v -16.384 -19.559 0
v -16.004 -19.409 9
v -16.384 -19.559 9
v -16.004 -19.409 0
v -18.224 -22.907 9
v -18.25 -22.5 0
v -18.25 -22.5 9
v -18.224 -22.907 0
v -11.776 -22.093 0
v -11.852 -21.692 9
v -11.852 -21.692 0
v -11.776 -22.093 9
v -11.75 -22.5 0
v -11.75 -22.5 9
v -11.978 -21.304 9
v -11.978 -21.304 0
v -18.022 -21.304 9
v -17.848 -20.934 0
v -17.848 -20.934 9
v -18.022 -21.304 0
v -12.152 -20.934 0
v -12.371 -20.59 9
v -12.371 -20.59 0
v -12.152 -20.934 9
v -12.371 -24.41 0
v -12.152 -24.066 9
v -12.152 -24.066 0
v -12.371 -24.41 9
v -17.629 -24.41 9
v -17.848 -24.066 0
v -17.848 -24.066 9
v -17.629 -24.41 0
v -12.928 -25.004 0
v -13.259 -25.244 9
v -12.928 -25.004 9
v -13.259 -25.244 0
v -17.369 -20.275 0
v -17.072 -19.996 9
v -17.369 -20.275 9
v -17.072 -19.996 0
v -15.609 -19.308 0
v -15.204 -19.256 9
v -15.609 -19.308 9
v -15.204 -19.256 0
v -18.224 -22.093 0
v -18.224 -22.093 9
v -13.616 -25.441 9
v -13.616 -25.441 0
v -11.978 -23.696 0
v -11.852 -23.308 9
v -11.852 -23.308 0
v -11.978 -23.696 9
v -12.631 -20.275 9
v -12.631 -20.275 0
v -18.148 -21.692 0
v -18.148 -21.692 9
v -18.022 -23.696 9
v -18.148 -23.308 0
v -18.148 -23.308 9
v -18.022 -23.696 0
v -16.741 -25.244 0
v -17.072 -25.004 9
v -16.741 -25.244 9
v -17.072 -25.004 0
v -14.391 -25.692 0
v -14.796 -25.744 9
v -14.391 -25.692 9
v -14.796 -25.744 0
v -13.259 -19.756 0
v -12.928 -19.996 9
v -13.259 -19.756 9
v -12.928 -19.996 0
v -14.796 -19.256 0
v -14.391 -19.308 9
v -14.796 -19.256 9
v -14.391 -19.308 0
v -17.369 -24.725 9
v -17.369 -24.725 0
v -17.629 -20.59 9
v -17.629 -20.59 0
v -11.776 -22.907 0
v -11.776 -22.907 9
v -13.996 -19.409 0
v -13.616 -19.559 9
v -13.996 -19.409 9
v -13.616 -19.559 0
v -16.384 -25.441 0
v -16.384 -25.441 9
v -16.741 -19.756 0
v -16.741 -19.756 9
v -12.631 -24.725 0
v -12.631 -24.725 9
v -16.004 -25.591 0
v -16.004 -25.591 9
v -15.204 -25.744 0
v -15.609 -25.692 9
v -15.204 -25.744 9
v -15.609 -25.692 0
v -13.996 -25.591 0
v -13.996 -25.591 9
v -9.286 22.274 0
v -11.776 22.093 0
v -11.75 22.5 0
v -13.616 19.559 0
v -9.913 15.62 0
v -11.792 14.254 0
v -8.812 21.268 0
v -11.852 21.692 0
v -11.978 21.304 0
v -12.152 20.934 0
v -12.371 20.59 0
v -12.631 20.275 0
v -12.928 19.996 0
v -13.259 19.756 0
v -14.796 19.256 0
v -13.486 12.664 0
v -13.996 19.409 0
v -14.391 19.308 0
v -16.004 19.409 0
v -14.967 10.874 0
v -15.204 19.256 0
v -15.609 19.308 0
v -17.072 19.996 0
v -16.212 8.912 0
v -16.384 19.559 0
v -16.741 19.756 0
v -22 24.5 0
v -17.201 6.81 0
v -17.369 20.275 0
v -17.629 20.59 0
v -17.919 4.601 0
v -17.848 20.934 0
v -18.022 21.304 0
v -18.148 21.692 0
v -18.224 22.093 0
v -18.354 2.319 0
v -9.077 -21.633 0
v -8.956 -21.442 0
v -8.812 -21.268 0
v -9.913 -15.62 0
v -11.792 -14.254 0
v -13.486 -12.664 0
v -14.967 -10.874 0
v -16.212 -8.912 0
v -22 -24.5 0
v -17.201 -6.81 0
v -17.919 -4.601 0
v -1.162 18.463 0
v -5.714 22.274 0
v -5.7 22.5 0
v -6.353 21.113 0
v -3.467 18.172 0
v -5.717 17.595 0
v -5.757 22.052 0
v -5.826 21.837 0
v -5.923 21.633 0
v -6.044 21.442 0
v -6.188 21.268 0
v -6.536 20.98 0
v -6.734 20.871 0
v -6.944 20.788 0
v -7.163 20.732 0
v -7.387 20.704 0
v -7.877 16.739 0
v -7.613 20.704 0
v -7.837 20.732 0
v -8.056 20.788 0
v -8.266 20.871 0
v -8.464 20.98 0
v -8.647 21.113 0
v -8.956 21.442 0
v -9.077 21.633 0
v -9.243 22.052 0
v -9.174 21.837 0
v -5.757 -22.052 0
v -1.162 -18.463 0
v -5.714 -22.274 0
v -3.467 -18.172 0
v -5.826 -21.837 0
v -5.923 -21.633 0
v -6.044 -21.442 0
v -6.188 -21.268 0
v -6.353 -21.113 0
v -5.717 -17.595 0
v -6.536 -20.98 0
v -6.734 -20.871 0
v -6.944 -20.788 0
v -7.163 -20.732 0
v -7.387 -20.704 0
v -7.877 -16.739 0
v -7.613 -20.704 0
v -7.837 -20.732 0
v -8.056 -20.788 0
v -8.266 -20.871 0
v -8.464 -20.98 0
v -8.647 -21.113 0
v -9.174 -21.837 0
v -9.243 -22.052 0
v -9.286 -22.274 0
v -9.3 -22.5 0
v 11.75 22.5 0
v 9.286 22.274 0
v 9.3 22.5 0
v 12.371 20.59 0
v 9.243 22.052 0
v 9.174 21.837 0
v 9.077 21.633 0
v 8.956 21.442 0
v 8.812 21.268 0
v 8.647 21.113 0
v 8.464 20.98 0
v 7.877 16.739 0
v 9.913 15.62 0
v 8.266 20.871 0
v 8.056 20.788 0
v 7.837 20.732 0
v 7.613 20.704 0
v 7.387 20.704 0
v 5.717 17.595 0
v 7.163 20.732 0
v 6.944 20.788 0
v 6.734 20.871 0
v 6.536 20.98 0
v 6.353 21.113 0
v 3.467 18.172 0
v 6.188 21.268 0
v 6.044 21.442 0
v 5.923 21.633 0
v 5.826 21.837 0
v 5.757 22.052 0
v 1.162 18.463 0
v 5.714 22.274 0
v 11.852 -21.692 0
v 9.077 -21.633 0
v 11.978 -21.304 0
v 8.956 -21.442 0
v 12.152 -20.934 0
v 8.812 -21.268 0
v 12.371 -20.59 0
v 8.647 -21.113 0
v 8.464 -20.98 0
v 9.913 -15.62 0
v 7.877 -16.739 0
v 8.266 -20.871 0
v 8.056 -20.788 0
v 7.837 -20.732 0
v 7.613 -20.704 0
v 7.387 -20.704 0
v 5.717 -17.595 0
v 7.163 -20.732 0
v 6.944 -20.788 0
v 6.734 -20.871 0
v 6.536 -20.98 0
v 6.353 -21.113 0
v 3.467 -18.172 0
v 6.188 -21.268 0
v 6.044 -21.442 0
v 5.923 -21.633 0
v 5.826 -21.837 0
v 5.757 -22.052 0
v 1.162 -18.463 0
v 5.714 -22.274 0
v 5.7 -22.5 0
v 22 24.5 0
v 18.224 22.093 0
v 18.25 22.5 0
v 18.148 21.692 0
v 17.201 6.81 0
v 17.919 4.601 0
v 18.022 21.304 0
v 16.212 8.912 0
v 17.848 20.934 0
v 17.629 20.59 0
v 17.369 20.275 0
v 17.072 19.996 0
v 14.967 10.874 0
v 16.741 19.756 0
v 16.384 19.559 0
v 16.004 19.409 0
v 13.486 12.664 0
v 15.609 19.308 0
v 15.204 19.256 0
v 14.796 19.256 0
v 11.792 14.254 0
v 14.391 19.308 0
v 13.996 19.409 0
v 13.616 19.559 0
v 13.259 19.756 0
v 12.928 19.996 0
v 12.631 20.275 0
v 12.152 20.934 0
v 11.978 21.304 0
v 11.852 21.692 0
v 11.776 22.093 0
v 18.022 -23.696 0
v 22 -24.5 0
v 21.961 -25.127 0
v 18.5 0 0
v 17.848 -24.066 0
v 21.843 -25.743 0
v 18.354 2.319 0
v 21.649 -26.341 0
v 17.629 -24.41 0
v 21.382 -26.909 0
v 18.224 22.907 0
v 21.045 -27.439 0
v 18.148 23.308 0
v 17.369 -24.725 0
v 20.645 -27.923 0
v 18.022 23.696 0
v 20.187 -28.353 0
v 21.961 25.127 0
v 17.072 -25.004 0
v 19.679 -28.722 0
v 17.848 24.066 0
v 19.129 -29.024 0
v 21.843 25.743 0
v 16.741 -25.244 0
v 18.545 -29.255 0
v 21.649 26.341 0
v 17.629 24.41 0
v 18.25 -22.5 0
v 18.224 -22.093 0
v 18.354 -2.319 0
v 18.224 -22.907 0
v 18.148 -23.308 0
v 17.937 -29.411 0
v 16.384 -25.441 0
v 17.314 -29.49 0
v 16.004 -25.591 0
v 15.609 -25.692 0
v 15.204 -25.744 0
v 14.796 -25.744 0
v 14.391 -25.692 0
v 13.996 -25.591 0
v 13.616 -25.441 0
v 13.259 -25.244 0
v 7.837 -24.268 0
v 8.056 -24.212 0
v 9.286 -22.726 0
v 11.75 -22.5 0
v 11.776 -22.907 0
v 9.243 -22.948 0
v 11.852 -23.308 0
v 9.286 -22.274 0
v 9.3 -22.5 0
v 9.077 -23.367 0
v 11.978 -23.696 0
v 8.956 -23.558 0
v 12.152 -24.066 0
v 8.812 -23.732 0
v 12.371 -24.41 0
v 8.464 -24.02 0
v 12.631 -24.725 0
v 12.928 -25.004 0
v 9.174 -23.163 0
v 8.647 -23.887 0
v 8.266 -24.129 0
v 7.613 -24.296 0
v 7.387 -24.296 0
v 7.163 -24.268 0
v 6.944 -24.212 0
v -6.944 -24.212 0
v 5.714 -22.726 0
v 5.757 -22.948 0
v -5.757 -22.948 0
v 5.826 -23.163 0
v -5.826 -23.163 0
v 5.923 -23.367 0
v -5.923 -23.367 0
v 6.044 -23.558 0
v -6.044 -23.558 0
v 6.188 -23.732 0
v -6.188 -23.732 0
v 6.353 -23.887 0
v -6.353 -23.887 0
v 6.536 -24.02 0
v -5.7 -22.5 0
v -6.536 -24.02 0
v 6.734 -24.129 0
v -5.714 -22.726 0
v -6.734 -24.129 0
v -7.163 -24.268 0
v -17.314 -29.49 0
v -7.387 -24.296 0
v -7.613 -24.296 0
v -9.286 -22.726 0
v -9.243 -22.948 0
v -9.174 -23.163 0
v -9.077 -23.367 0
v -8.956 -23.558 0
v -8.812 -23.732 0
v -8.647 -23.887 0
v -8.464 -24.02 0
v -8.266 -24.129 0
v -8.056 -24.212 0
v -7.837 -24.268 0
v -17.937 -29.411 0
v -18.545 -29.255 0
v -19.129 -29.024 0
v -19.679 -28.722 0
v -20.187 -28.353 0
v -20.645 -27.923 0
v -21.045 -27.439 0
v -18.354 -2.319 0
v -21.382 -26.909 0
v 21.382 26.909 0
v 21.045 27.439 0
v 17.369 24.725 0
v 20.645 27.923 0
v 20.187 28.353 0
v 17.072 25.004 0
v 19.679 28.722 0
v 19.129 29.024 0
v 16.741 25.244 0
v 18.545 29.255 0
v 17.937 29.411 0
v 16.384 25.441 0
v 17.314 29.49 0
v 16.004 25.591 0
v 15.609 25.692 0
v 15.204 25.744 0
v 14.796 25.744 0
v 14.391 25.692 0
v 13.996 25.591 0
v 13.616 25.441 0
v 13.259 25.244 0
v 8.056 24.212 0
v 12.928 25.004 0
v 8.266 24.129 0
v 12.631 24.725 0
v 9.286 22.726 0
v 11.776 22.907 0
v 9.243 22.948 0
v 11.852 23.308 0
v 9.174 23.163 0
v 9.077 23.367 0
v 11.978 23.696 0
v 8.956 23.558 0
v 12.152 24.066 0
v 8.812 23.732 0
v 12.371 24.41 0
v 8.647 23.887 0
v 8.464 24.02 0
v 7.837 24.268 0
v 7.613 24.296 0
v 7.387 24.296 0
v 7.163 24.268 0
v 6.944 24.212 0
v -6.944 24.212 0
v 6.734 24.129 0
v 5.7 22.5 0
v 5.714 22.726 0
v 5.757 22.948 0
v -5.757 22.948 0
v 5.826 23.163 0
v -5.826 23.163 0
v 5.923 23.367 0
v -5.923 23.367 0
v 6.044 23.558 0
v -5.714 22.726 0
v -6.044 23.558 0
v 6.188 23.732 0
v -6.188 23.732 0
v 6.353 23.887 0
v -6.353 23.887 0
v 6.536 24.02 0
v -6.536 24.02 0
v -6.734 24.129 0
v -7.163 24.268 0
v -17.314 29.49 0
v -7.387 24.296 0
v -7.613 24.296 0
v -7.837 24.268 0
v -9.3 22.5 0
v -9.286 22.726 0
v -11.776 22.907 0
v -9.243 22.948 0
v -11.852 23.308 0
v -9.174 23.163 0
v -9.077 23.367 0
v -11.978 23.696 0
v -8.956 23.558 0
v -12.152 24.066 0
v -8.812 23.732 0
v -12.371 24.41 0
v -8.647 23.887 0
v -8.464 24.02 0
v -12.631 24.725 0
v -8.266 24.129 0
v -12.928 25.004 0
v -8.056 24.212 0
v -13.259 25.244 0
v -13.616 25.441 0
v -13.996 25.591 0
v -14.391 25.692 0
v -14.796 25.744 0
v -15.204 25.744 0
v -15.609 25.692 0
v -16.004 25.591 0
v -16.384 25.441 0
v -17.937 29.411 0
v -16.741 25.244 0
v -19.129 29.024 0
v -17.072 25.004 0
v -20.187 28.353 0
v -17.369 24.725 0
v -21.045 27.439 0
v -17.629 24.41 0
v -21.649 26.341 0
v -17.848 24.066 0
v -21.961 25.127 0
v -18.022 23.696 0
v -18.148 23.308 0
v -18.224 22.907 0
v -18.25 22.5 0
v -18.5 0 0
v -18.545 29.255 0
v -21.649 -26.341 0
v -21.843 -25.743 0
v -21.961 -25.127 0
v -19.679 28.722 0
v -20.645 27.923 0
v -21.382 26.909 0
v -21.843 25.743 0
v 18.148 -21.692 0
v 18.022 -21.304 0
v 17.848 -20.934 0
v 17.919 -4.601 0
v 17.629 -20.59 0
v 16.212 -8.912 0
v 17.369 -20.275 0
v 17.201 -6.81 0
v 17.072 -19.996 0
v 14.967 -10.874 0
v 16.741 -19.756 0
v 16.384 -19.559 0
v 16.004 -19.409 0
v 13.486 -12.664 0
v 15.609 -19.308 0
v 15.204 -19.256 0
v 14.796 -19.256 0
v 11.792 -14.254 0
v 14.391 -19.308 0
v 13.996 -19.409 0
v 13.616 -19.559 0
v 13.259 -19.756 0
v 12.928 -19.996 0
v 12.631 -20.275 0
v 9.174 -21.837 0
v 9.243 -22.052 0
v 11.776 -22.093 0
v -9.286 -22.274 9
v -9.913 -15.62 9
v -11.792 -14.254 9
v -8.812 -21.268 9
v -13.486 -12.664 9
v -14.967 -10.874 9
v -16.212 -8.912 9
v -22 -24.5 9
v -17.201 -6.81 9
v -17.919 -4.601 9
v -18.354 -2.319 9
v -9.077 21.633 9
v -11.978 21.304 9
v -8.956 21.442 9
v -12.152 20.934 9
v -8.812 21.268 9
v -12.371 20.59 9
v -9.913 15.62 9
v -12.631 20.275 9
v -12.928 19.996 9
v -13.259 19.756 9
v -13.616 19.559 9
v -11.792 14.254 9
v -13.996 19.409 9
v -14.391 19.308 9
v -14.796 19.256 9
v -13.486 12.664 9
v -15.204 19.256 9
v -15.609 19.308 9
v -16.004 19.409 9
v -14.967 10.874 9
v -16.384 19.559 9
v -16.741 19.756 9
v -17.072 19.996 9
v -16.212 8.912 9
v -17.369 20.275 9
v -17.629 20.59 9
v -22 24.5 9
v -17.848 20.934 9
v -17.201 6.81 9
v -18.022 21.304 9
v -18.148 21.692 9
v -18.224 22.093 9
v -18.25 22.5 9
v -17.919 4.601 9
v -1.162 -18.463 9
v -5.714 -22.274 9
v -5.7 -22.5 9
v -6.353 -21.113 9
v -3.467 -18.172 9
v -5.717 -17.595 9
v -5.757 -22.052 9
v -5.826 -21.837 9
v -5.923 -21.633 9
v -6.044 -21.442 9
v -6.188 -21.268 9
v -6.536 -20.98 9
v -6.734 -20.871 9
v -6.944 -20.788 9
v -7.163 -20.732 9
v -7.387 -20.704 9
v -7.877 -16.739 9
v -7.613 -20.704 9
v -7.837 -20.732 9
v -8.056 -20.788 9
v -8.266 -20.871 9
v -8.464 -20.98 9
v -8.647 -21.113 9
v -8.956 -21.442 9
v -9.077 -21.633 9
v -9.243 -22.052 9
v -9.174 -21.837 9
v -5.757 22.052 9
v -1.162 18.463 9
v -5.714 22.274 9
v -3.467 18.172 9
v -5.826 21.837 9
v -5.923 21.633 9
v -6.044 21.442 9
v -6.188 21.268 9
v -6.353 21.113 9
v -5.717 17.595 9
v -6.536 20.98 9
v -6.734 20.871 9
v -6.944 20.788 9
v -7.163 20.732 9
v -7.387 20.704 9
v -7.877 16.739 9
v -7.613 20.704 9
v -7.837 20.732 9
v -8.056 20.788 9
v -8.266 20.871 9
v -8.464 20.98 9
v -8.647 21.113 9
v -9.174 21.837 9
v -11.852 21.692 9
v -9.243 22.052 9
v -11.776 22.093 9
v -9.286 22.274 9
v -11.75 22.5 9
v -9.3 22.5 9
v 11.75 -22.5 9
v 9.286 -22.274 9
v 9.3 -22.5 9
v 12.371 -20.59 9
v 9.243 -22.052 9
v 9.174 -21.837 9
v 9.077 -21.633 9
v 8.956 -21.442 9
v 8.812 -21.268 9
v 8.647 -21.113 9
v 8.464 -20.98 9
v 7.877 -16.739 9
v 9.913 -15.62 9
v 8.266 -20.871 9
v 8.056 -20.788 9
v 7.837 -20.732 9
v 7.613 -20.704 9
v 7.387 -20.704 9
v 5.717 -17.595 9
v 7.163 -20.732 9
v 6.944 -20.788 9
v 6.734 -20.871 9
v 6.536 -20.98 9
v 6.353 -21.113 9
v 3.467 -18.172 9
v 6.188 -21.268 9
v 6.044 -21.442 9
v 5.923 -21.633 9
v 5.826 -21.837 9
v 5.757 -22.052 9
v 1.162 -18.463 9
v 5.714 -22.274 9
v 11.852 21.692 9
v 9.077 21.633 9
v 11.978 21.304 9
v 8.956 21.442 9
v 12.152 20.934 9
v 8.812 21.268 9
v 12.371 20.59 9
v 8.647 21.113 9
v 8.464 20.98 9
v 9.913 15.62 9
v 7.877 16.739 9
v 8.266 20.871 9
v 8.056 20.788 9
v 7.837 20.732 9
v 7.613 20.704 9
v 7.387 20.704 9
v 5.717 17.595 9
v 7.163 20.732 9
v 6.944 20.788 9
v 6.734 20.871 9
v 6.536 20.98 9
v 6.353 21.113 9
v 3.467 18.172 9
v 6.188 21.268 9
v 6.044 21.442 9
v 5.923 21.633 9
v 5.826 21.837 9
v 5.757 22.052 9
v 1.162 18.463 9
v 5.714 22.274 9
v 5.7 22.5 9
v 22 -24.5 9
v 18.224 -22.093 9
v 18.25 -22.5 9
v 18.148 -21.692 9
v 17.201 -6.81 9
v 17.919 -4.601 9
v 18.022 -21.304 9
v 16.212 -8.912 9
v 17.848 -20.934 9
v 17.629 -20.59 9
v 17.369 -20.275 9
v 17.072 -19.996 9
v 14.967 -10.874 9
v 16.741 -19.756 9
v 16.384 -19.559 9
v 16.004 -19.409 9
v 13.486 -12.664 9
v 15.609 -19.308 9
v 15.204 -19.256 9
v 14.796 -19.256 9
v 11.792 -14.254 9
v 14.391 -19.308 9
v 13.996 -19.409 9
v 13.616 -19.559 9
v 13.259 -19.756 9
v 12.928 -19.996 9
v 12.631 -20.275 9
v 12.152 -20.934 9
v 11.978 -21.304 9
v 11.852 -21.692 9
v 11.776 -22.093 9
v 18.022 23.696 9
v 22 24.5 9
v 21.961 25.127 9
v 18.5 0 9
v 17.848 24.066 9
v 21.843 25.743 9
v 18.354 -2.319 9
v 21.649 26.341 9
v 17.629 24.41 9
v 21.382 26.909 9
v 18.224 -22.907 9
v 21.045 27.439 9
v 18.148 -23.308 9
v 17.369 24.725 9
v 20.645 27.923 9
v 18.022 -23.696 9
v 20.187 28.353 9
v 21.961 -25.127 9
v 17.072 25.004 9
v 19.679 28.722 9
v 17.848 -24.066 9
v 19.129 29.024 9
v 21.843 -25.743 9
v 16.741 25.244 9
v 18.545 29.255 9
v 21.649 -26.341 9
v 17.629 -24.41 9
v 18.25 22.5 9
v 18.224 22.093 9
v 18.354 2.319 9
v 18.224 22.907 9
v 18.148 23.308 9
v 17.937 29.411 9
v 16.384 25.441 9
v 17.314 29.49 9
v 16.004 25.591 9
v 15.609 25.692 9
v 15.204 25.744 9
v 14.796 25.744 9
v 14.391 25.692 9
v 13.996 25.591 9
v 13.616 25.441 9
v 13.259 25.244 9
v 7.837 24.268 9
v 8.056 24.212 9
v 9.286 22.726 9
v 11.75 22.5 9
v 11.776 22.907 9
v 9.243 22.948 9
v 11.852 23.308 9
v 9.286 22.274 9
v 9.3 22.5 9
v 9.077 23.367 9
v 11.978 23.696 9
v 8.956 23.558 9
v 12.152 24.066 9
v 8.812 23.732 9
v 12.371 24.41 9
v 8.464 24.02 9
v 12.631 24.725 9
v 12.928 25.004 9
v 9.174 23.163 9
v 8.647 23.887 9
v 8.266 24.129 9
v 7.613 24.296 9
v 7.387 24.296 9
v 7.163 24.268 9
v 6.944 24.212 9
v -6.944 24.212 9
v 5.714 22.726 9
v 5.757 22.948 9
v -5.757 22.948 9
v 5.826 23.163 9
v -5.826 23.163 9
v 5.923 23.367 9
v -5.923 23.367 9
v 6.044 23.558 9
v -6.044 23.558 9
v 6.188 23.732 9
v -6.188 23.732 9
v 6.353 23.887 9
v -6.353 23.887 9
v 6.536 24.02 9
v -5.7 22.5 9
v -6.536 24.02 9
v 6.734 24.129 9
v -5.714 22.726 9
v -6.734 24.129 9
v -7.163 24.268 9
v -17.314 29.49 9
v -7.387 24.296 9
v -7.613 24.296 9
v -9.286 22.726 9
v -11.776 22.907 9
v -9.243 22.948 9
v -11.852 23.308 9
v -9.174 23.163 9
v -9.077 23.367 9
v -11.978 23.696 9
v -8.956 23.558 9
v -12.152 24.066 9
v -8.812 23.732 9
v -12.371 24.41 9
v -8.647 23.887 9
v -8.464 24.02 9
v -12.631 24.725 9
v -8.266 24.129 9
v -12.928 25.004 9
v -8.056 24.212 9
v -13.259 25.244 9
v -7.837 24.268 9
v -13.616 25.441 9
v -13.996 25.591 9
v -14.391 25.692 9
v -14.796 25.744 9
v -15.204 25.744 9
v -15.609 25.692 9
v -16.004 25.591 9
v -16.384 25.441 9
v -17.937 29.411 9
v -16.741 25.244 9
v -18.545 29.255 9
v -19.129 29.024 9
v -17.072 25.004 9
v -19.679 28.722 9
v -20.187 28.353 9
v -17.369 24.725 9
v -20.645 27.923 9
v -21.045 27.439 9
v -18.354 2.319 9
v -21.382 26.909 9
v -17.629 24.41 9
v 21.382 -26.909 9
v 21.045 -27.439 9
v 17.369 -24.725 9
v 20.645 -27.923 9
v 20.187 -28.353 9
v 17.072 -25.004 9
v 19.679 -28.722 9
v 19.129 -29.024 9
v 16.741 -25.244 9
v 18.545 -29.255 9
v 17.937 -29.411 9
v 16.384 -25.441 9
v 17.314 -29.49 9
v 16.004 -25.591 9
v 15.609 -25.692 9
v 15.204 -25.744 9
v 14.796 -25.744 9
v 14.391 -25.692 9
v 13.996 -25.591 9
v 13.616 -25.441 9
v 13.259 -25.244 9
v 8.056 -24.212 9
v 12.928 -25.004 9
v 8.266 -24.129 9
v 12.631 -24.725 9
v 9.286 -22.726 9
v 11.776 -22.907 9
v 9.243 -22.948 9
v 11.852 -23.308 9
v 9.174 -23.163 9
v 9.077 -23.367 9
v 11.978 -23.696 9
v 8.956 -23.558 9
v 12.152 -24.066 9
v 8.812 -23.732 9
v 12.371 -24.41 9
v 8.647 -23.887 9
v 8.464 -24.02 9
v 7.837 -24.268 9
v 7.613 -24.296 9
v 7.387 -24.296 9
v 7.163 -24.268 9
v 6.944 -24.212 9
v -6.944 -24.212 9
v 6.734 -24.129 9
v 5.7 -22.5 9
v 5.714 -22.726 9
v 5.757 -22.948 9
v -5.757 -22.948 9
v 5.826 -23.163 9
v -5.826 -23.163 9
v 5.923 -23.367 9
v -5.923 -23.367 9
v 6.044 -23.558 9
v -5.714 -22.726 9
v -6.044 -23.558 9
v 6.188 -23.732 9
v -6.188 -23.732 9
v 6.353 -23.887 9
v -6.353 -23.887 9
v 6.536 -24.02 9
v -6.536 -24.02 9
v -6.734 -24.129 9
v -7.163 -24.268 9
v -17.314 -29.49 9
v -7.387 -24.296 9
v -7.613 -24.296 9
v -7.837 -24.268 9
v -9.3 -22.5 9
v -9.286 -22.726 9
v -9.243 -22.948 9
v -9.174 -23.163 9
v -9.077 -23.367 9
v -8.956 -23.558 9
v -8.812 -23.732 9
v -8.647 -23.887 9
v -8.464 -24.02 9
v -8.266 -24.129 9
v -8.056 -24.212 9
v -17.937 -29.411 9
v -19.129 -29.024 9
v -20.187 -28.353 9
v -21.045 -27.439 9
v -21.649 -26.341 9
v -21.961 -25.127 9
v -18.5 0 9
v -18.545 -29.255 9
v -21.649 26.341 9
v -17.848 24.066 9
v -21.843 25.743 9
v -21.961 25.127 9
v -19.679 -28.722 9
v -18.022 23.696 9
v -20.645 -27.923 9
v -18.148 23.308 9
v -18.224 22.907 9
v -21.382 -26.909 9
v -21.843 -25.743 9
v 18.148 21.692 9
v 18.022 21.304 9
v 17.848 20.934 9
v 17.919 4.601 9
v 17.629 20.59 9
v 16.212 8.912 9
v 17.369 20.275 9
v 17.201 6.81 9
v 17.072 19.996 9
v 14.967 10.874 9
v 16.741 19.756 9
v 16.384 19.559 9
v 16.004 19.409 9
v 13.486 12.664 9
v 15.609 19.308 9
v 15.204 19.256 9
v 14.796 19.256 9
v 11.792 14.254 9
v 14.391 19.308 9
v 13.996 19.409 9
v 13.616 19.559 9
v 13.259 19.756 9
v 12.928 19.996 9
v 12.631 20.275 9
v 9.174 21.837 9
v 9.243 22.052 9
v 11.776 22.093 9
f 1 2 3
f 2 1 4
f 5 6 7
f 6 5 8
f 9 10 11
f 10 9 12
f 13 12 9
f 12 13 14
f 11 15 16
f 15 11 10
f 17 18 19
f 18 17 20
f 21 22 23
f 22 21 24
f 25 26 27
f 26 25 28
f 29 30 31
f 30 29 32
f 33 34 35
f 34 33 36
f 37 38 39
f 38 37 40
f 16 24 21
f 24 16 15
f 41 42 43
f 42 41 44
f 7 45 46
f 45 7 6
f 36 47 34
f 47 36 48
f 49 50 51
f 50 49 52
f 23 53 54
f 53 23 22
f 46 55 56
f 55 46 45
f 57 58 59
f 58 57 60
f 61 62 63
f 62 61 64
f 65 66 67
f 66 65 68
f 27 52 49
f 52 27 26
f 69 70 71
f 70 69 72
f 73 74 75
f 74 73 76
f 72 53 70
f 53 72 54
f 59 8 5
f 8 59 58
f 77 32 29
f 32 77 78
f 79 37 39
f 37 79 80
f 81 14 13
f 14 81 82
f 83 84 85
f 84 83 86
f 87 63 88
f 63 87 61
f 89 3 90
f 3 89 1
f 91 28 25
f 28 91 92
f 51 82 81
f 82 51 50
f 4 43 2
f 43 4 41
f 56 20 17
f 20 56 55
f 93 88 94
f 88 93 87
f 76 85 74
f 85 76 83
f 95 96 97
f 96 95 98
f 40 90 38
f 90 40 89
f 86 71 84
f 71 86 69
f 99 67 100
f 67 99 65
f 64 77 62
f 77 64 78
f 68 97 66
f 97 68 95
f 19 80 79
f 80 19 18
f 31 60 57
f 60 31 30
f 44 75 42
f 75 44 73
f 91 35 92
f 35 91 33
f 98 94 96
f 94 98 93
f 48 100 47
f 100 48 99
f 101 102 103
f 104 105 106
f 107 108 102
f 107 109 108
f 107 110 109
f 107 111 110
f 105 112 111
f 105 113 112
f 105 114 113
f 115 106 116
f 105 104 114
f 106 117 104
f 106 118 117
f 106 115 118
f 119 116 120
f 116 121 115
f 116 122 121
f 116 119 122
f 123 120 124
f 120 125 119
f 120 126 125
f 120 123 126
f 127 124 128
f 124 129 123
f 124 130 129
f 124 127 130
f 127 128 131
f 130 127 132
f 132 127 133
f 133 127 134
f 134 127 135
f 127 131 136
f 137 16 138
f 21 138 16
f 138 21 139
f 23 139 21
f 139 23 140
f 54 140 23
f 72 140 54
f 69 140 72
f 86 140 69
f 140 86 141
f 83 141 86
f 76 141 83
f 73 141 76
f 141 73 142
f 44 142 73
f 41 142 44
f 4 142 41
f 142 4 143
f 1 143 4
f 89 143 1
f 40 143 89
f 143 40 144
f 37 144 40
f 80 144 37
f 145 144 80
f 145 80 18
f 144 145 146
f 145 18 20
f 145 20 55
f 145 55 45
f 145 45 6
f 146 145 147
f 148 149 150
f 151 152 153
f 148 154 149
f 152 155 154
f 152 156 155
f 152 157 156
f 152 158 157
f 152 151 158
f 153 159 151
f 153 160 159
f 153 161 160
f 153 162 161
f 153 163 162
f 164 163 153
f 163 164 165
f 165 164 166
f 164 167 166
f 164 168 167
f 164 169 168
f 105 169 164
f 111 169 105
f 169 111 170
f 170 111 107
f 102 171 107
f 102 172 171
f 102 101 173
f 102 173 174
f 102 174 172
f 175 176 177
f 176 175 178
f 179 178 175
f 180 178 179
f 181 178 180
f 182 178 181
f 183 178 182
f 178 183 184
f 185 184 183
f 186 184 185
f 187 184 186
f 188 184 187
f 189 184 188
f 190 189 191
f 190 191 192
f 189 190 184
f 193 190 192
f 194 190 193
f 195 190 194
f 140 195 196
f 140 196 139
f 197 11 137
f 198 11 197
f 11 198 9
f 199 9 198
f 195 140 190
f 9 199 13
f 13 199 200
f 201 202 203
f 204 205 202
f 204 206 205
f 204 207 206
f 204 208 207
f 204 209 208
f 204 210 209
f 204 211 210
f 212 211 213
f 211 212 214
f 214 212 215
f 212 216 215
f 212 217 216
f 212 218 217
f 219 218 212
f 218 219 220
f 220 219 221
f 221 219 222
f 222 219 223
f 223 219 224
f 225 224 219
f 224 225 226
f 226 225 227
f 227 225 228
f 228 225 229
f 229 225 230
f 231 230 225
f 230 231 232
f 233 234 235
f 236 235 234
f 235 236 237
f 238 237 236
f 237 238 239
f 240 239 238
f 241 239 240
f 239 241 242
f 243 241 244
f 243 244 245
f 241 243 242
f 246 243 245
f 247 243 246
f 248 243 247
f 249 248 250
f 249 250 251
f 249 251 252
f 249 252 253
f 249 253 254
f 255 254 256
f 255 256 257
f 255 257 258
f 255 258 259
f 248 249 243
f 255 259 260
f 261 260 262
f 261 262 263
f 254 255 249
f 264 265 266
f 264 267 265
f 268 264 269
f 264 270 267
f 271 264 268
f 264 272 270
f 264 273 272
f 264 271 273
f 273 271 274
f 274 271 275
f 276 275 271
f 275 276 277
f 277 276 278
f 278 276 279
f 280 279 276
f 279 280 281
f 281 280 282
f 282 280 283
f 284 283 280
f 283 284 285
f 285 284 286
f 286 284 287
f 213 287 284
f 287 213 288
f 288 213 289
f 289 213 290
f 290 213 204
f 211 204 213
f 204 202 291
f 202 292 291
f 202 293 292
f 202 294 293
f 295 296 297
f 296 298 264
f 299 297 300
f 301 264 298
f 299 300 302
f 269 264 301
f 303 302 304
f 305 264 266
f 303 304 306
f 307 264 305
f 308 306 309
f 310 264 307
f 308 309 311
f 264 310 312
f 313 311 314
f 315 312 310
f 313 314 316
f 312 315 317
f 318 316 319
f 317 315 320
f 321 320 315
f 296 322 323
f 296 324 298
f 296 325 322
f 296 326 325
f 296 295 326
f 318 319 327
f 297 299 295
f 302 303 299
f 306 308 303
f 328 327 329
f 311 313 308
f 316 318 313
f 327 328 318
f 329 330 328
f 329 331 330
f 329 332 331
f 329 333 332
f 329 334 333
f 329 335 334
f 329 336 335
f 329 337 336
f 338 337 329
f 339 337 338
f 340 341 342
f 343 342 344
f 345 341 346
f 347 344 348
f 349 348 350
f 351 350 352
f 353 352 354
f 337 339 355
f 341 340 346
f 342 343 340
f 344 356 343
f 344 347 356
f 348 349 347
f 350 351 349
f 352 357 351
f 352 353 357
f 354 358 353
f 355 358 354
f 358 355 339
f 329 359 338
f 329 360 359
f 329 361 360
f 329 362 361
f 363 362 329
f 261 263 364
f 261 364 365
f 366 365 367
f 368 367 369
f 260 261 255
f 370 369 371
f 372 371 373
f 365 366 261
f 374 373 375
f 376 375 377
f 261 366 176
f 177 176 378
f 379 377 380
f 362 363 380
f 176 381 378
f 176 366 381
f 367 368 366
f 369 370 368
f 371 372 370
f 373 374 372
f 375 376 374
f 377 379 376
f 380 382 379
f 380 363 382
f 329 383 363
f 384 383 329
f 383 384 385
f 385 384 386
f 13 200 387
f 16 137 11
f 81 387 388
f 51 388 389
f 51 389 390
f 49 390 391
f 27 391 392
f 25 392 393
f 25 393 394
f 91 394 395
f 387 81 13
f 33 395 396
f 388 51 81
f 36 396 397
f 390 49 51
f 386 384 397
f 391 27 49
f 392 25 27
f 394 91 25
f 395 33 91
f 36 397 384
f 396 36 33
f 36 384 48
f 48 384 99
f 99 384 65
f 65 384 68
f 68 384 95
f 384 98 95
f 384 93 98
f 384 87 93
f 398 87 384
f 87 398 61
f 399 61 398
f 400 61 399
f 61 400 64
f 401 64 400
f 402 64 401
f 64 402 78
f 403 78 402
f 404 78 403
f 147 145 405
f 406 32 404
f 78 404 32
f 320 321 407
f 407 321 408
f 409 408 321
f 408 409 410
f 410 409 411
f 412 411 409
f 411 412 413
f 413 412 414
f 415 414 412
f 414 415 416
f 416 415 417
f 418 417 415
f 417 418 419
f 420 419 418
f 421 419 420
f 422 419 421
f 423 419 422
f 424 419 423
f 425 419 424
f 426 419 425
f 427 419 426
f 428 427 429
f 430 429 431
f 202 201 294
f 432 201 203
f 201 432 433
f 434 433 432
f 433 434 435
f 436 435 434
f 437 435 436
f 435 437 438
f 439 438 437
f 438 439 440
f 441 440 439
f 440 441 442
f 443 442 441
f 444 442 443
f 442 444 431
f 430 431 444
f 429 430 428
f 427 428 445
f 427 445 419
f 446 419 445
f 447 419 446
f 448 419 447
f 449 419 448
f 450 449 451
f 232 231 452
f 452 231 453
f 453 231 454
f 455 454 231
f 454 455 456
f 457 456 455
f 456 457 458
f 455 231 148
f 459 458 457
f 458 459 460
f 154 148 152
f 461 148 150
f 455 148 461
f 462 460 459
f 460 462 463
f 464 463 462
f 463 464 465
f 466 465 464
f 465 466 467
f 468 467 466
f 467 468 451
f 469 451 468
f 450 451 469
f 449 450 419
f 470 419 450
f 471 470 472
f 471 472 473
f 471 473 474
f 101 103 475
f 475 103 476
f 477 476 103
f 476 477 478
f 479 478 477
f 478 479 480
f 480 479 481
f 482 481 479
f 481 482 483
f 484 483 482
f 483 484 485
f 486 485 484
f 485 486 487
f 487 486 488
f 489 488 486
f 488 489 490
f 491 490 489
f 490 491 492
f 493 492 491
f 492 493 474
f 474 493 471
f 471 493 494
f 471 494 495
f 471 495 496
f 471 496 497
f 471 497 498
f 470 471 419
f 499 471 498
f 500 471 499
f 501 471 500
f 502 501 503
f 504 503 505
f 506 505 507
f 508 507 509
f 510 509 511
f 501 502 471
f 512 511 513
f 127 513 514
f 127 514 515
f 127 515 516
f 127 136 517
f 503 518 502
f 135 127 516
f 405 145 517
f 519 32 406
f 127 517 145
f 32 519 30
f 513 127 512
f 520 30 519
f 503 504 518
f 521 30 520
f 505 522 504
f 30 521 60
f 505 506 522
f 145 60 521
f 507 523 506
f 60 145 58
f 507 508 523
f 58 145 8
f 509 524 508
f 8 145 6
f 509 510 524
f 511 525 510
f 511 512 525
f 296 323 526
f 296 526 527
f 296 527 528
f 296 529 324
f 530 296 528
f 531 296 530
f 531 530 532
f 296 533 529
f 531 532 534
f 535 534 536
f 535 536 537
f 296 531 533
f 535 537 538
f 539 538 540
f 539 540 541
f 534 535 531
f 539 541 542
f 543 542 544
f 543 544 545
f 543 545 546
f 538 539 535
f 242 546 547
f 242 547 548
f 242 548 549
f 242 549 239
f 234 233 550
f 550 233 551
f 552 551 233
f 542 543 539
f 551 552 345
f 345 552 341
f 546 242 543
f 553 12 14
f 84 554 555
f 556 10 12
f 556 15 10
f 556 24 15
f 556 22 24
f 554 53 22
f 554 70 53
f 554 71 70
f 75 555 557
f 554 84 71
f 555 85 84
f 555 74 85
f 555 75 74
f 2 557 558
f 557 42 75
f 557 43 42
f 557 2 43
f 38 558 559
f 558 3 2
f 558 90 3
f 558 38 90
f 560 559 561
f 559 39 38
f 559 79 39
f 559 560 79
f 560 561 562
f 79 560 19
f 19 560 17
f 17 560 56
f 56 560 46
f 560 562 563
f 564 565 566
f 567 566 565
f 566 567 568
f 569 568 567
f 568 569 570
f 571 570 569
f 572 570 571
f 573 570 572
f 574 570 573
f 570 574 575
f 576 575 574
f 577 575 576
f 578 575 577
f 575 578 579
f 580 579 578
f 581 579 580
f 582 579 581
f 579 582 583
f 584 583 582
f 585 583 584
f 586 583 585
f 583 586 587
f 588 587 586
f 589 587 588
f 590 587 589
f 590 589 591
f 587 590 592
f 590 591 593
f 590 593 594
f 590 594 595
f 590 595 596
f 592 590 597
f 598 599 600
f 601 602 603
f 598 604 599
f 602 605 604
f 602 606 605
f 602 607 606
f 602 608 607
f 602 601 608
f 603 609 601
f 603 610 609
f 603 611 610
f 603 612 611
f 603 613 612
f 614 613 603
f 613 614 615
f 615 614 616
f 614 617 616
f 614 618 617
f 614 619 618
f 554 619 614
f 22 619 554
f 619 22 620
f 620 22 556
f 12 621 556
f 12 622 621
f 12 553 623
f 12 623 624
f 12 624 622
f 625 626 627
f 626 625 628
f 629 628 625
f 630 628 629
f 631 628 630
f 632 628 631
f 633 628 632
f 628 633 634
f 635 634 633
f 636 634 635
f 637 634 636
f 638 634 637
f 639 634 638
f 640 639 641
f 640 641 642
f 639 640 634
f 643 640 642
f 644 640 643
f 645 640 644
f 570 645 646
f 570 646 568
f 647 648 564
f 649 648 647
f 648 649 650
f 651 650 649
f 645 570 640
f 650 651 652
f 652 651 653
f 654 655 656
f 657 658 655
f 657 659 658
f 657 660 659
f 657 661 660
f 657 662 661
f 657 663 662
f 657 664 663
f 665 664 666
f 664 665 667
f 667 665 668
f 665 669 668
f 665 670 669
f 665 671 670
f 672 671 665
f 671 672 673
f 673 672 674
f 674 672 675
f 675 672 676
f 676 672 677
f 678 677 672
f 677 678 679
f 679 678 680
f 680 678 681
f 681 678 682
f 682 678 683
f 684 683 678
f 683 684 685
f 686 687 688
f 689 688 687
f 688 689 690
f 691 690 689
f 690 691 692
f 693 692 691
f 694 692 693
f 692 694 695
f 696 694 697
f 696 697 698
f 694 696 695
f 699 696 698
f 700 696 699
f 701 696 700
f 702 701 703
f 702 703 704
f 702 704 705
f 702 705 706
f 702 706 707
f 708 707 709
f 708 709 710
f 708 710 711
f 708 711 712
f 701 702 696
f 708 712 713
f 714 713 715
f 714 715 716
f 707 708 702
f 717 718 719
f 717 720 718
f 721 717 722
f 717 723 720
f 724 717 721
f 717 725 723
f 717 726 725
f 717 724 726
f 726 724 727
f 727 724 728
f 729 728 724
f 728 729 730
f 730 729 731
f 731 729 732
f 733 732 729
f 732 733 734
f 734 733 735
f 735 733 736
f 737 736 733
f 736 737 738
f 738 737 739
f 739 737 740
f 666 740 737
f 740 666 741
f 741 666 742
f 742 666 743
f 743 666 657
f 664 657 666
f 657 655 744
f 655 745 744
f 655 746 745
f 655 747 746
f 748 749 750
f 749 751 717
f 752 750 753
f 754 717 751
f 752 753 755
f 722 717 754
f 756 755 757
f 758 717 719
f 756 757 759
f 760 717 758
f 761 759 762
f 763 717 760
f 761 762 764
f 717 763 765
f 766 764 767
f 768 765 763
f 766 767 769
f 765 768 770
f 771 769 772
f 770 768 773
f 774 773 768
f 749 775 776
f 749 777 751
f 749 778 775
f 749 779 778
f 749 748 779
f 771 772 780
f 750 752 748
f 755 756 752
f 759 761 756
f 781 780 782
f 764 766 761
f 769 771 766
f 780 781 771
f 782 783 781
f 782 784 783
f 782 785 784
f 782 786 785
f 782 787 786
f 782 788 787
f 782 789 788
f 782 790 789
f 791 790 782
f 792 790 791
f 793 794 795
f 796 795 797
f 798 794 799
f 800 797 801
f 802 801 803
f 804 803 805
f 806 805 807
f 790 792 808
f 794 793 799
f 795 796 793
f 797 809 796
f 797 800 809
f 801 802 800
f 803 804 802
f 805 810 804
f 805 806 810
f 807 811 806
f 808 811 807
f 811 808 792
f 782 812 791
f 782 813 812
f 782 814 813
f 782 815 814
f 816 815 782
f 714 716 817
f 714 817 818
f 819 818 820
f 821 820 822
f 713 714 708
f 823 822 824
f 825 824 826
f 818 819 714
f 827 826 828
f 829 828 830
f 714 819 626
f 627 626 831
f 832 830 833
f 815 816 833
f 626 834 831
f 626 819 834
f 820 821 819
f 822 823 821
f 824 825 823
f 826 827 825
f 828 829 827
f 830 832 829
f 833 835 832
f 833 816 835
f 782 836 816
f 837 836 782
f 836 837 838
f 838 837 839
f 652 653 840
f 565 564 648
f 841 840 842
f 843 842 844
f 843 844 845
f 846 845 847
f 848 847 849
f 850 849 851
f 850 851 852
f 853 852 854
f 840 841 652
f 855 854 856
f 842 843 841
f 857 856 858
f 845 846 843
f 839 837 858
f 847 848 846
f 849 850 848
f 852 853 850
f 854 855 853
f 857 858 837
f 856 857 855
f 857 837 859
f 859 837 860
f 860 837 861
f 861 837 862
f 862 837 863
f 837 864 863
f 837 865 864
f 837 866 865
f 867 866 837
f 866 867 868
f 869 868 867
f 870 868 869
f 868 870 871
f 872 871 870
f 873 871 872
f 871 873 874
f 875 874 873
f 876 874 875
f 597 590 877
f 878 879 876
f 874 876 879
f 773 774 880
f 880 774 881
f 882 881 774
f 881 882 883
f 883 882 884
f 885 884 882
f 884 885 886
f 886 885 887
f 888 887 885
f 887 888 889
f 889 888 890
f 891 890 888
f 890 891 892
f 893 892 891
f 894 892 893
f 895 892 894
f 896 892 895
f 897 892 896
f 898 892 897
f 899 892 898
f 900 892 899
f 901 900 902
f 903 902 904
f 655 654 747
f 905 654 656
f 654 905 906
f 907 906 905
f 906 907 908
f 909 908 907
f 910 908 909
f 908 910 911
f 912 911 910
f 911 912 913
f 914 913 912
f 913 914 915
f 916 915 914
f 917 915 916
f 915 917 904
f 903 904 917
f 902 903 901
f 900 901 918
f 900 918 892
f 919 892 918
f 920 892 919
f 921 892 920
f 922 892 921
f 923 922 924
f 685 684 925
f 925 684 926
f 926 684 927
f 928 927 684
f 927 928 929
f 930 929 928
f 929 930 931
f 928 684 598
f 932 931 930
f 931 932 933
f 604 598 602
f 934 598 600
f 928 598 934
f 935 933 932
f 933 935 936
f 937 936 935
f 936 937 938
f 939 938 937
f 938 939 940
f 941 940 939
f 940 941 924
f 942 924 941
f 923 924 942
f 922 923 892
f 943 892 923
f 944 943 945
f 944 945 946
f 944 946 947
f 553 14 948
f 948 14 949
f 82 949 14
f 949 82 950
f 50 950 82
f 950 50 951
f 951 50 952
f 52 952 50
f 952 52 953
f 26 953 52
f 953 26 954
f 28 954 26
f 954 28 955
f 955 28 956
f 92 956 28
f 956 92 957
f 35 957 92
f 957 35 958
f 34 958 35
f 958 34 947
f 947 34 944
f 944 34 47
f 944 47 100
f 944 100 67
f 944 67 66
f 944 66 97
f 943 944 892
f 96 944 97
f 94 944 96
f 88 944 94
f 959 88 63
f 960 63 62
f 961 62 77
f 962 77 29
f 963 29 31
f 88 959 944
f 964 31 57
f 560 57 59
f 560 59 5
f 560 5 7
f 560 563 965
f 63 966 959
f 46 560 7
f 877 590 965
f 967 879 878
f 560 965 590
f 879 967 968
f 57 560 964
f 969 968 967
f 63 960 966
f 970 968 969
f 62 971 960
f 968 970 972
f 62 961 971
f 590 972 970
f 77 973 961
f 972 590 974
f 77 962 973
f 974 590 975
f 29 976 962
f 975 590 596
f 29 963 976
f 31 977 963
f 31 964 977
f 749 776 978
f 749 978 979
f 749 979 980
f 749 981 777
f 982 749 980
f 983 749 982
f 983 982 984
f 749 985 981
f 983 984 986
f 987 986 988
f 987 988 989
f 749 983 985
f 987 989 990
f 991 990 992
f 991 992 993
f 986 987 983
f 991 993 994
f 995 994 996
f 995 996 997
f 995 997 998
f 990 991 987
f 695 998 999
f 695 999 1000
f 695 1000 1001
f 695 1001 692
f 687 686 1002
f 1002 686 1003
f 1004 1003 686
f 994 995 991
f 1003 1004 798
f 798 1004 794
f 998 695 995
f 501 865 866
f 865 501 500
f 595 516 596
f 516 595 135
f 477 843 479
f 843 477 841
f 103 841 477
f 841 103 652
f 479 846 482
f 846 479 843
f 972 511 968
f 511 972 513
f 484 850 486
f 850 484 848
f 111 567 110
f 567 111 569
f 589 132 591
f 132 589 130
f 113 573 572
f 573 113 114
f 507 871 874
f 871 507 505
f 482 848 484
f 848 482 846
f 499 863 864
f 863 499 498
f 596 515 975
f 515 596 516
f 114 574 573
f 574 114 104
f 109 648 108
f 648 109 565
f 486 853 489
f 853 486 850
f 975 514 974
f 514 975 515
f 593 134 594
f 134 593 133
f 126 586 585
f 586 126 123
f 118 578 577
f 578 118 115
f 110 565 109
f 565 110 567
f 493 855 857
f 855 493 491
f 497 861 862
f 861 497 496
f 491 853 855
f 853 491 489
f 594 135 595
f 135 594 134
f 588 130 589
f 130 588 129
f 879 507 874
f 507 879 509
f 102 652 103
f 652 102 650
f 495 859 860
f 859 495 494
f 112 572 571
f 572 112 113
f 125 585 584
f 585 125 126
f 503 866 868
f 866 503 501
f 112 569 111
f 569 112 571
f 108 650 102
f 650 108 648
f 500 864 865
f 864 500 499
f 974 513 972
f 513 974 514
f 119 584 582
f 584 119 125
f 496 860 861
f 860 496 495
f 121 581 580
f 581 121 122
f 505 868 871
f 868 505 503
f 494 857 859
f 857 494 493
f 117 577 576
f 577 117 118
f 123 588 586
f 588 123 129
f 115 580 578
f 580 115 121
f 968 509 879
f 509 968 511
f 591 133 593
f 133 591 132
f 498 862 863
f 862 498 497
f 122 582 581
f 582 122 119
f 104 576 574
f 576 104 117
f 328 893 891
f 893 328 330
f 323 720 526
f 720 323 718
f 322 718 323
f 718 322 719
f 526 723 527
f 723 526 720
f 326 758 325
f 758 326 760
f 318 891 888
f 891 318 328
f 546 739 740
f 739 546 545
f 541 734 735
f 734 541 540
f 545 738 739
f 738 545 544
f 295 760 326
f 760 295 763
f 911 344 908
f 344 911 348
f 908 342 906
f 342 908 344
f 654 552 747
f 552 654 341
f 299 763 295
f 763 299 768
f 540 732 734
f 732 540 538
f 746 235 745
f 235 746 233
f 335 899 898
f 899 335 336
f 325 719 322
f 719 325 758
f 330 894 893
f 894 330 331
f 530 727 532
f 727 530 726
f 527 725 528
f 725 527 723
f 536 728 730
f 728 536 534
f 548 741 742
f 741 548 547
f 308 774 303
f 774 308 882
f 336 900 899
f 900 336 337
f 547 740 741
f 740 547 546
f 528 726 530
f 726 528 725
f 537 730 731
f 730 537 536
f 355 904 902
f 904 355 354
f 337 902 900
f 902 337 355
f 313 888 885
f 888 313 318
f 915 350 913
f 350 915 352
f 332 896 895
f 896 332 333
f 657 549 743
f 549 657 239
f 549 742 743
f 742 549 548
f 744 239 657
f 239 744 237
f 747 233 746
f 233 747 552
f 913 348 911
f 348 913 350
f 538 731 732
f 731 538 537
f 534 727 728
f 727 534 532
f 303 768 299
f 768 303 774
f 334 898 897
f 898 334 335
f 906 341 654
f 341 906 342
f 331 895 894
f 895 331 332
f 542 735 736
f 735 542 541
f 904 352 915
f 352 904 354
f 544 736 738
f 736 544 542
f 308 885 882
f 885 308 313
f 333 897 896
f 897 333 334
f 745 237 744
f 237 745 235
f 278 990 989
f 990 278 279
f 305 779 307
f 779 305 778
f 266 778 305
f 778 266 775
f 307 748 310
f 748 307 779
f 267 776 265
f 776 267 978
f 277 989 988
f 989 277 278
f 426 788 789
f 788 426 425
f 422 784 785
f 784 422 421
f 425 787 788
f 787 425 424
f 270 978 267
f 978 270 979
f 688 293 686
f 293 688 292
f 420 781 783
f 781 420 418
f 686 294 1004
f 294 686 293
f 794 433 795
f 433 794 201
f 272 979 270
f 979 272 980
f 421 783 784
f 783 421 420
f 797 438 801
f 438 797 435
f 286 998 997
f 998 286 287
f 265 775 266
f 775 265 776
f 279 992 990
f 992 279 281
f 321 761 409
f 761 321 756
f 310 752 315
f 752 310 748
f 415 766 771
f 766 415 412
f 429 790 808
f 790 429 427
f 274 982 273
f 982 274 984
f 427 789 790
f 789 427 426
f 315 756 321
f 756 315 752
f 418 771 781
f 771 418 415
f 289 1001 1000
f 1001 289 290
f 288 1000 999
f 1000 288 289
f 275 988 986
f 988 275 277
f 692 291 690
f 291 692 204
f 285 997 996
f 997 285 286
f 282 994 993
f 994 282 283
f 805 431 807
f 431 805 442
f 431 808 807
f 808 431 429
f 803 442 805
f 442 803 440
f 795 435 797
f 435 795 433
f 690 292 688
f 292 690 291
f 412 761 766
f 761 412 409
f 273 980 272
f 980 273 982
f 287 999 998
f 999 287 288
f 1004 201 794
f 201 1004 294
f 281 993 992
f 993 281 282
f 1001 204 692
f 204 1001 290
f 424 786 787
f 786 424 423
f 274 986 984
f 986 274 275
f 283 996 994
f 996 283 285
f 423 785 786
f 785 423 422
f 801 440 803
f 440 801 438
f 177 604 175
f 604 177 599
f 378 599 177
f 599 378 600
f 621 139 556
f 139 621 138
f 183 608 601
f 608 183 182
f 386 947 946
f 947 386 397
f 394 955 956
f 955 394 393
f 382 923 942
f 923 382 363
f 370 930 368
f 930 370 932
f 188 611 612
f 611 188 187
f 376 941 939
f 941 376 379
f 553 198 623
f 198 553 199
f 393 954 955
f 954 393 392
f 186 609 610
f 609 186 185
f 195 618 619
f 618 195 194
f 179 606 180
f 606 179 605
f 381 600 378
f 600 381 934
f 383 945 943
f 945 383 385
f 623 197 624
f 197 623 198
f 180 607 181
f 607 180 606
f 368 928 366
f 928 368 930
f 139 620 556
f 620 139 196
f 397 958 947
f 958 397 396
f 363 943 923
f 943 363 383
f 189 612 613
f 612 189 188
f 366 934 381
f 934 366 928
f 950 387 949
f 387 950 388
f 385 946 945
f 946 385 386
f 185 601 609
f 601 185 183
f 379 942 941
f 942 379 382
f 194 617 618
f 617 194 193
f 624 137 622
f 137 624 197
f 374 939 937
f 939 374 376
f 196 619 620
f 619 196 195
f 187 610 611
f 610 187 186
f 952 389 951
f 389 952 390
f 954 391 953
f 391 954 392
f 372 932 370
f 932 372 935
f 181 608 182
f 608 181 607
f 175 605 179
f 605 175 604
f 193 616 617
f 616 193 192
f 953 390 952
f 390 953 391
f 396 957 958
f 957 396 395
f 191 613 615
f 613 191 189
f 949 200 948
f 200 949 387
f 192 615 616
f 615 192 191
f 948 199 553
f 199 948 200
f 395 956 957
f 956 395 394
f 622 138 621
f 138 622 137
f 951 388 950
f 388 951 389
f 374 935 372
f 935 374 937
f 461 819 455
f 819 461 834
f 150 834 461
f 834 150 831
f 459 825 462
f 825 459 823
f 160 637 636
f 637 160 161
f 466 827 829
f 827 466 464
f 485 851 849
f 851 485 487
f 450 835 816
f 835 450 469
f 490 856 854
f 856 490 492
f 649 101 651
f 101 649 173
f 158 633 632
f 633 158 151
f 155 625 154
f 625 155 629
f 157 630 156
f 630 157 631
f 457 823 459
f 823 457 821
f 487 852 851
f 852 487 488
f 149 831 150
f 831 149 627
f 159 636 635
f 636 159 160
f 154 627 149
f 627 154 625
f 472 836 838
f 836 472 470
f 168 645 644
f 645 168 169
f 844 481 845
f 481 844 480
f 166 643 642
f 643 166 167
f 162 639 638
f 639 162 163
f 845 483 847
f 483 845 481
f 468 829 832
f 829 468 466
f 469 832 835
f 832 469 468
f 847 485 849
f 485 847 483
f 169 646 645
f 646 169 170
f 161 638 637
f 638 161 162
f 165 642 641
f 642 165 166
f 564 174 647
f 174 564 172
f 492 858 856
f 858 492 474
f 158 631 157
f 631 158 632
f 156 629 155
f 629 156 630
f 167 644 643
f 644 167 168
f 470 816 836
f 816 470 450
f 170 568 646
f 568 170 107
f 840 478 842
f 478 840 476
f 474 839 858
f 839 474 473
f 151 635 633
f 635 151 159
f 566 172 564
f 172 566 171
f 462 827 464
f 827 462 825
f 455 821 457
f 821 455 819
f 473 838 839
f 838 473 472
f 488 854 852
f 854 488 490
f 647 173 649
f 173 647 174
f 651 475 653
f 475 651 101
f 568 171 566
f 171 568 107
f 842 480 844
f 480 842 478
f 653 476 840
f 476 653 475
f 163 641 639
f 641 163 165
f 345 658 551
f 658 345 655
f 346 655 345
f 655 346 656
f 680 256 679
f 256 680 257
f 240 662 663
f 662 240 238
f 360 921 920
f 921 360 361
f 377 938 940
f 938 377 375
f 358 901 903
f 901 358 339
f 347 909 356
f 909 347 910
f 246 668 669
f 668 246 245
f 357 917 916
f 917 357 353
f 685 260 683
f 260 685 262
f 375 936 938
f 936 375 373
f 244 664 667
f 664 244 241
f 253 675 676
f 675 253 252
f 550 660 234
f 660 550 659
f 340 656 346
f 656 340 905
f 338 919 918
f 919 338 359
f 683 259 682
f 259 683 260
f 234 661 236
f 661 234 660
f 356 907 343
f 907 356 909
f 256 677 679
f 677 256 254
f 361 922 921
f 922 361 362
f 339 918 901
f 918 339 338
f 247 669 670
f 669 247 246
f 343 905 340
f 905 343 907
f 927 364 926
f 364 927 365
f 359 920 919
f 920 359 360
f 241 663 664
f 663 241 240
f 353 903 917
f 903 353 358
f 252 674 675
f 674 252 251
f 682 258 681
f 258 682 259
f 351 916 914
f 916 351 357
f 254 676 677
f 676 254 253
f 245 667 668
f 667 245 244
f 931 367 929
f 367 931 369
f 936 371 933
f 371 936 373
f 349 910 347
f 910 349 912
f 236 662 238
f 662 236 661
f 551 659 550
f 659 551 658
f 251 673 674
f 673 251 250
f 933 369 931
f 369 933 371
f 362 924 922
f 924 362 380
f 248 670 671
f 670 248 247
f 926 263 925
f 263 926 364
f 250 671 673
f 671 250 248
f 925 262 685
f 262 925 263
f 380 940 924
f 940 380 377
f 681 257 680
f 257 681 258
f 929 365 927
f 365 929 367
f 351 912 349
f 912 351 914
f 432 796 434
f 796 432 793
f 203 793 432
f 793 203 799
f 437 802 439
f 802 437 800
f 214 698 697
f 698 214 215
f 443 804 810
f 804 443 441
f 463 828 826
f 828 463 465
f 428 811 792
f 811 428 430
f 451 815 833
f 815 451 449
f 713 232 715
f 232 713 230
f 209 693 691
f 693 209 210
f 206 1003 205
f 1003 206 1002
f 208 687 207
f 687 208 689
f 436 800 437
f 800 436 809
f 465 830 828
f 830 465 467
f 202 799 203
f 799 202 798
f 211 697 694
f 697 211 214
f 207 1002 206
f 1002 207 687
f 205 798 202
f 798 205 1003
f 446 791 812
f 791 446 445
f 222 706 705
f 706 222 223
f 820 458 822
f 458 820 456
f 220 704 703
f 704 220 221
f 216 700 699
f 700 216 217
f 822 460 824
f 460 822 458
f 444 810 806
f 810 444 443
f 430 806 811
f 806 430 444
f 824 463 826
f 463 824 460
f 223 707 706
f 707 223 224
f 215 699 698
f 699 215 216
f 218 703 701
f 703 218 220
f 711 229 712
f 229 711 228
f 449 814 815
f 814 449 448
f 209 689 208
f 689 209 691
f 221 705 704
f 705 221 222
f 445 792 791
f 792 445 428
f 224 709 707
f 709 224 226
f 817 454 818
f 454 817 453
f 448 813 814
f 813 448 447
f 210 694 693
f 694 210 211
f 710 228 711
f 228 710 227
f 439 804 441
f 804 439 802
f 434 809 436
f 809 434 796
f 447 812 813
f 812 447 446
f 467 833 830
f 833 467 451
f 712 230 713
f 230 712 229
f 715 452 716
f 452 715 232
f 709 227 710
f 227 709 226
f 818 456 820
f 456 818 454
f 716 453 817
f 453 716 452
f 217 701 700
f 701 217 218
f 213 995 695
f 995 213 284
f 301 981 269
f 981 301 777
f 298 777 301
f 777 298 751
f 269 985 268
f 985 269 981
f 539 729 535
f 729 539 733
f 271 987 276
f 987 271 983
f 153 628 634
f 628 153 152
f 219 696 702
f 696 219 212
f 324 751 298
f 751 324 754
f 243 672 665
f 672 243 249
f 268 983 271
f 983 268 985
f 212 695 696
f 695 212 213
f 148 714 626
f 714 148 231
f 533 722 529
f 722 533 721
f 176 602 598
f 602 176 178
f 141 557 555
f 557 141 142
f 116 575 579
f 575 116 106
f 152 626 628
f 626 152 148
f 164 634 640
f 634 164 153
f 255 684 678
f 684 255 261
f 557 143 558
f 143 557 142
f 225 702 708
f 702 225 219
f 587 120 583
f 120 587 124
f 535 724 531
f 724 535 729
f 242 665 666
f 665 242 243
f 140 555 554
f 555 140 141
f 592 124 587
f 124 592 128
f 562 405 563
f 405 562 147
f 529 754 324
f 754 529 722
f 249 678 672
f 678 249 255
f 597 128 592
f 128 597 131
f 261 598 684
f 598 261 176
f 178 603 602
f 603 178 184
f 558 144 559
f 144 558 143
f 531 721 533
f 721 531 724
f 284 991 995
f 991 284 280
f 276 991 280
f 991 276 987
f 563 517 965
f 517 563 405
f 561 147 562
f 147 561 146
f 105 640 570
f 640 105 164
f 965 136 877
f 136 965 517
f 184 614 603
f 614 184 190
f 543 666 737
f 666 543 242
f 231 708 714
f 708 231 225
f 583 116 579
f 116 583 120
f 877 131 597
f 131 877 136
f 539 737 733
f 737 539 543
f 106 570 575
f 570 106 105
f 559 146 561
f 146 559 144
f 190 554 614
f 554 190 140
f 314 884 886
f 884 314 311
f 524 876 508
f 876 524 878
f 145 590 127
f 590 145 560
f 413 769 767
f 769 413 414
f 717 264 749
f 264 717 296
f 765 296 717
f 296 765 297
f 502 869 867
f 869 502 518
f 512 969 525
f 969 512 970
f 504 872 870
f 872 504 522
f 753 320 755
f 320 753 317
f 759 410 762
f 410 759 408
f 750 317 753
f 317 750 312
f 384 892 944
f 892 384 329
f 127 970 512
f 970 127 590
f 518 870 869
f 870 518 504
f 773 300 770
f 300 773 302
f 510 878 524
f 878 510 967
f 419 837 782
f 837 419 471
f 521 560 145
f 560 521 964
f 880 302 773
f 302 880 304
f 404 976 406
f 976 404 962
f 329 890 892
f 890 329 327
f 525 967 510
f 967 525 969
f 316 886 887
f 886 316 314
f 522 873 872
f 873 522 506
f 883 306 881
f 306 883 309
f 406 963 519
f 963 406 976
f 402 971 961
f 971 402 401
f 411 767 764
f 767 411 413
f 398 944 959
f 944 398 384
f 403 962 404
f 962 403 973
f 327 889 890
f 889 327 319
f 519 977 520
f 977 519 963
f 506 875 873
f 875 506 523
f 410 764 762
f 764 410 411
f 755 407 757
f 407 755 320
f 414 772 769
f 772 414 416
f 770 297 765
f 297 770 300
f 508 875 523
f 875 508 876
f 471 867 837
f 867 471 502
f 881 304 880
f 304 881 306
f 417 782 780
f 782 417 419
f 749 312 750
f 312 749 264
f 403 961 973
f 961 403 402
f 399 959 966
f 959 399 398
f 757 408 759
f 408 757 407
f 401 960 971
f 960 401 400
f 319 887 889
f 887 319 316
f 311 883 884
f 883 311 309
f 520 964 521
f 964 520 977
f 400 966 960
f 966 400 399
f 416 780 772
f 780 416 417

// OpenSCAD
$fn = 50;

difference() {
	union() {
		hull() {
			translate(v = [-17.0, 24.5, 0]) {
				cylinder(h = 9, r = 5);
			}
			translate(v = [17.0, 24.5, 0]) {
				cylinder(h = 9, r = 5);
			}
			translate(v = [-17.0, -24.5, 0]) {
				cylinder(h = 9, r = 5);
			}
			translate(v = [17.0, -24.5, 0]) {
				cylinder(h = 9, r = 5);
			}
		}
	}
	union() {
		translate(v = [-15.0, -22.5, 0]) {
			cylinder(h = 9, r = 3.25);
		}
		translate(v = [-15.0, 22.5, 0]) {
			cylinder(h = 9, r = 3.25);
		}
		translate(v = [15.0, -22.5, 0]) {
			cylinder(h = 9, r = 3.25);
		}
		translate(v = [15.0, 22.5, 0]) {
			cylinder(h = 9, r = 3.25);
		}
		translate(v = [-7.5, -22.5, 0]) {
			cylinder(h = 9, r = 1.8);
		}
		translate(v = [-7.5, 22.5, 0]) {
			cylinder(h = 9, r = 1.8);
		}
		translate(v = [7.5, -22.5, 0]) {
			cylinder(h = 9, r = 1.8);
		}
		translate(v = [7.5, 22.5, 0]) {
			cylinder(h = 9, r = 1.8);
		}
		cylinder(h = 9, r = 18.5);
	}
}
